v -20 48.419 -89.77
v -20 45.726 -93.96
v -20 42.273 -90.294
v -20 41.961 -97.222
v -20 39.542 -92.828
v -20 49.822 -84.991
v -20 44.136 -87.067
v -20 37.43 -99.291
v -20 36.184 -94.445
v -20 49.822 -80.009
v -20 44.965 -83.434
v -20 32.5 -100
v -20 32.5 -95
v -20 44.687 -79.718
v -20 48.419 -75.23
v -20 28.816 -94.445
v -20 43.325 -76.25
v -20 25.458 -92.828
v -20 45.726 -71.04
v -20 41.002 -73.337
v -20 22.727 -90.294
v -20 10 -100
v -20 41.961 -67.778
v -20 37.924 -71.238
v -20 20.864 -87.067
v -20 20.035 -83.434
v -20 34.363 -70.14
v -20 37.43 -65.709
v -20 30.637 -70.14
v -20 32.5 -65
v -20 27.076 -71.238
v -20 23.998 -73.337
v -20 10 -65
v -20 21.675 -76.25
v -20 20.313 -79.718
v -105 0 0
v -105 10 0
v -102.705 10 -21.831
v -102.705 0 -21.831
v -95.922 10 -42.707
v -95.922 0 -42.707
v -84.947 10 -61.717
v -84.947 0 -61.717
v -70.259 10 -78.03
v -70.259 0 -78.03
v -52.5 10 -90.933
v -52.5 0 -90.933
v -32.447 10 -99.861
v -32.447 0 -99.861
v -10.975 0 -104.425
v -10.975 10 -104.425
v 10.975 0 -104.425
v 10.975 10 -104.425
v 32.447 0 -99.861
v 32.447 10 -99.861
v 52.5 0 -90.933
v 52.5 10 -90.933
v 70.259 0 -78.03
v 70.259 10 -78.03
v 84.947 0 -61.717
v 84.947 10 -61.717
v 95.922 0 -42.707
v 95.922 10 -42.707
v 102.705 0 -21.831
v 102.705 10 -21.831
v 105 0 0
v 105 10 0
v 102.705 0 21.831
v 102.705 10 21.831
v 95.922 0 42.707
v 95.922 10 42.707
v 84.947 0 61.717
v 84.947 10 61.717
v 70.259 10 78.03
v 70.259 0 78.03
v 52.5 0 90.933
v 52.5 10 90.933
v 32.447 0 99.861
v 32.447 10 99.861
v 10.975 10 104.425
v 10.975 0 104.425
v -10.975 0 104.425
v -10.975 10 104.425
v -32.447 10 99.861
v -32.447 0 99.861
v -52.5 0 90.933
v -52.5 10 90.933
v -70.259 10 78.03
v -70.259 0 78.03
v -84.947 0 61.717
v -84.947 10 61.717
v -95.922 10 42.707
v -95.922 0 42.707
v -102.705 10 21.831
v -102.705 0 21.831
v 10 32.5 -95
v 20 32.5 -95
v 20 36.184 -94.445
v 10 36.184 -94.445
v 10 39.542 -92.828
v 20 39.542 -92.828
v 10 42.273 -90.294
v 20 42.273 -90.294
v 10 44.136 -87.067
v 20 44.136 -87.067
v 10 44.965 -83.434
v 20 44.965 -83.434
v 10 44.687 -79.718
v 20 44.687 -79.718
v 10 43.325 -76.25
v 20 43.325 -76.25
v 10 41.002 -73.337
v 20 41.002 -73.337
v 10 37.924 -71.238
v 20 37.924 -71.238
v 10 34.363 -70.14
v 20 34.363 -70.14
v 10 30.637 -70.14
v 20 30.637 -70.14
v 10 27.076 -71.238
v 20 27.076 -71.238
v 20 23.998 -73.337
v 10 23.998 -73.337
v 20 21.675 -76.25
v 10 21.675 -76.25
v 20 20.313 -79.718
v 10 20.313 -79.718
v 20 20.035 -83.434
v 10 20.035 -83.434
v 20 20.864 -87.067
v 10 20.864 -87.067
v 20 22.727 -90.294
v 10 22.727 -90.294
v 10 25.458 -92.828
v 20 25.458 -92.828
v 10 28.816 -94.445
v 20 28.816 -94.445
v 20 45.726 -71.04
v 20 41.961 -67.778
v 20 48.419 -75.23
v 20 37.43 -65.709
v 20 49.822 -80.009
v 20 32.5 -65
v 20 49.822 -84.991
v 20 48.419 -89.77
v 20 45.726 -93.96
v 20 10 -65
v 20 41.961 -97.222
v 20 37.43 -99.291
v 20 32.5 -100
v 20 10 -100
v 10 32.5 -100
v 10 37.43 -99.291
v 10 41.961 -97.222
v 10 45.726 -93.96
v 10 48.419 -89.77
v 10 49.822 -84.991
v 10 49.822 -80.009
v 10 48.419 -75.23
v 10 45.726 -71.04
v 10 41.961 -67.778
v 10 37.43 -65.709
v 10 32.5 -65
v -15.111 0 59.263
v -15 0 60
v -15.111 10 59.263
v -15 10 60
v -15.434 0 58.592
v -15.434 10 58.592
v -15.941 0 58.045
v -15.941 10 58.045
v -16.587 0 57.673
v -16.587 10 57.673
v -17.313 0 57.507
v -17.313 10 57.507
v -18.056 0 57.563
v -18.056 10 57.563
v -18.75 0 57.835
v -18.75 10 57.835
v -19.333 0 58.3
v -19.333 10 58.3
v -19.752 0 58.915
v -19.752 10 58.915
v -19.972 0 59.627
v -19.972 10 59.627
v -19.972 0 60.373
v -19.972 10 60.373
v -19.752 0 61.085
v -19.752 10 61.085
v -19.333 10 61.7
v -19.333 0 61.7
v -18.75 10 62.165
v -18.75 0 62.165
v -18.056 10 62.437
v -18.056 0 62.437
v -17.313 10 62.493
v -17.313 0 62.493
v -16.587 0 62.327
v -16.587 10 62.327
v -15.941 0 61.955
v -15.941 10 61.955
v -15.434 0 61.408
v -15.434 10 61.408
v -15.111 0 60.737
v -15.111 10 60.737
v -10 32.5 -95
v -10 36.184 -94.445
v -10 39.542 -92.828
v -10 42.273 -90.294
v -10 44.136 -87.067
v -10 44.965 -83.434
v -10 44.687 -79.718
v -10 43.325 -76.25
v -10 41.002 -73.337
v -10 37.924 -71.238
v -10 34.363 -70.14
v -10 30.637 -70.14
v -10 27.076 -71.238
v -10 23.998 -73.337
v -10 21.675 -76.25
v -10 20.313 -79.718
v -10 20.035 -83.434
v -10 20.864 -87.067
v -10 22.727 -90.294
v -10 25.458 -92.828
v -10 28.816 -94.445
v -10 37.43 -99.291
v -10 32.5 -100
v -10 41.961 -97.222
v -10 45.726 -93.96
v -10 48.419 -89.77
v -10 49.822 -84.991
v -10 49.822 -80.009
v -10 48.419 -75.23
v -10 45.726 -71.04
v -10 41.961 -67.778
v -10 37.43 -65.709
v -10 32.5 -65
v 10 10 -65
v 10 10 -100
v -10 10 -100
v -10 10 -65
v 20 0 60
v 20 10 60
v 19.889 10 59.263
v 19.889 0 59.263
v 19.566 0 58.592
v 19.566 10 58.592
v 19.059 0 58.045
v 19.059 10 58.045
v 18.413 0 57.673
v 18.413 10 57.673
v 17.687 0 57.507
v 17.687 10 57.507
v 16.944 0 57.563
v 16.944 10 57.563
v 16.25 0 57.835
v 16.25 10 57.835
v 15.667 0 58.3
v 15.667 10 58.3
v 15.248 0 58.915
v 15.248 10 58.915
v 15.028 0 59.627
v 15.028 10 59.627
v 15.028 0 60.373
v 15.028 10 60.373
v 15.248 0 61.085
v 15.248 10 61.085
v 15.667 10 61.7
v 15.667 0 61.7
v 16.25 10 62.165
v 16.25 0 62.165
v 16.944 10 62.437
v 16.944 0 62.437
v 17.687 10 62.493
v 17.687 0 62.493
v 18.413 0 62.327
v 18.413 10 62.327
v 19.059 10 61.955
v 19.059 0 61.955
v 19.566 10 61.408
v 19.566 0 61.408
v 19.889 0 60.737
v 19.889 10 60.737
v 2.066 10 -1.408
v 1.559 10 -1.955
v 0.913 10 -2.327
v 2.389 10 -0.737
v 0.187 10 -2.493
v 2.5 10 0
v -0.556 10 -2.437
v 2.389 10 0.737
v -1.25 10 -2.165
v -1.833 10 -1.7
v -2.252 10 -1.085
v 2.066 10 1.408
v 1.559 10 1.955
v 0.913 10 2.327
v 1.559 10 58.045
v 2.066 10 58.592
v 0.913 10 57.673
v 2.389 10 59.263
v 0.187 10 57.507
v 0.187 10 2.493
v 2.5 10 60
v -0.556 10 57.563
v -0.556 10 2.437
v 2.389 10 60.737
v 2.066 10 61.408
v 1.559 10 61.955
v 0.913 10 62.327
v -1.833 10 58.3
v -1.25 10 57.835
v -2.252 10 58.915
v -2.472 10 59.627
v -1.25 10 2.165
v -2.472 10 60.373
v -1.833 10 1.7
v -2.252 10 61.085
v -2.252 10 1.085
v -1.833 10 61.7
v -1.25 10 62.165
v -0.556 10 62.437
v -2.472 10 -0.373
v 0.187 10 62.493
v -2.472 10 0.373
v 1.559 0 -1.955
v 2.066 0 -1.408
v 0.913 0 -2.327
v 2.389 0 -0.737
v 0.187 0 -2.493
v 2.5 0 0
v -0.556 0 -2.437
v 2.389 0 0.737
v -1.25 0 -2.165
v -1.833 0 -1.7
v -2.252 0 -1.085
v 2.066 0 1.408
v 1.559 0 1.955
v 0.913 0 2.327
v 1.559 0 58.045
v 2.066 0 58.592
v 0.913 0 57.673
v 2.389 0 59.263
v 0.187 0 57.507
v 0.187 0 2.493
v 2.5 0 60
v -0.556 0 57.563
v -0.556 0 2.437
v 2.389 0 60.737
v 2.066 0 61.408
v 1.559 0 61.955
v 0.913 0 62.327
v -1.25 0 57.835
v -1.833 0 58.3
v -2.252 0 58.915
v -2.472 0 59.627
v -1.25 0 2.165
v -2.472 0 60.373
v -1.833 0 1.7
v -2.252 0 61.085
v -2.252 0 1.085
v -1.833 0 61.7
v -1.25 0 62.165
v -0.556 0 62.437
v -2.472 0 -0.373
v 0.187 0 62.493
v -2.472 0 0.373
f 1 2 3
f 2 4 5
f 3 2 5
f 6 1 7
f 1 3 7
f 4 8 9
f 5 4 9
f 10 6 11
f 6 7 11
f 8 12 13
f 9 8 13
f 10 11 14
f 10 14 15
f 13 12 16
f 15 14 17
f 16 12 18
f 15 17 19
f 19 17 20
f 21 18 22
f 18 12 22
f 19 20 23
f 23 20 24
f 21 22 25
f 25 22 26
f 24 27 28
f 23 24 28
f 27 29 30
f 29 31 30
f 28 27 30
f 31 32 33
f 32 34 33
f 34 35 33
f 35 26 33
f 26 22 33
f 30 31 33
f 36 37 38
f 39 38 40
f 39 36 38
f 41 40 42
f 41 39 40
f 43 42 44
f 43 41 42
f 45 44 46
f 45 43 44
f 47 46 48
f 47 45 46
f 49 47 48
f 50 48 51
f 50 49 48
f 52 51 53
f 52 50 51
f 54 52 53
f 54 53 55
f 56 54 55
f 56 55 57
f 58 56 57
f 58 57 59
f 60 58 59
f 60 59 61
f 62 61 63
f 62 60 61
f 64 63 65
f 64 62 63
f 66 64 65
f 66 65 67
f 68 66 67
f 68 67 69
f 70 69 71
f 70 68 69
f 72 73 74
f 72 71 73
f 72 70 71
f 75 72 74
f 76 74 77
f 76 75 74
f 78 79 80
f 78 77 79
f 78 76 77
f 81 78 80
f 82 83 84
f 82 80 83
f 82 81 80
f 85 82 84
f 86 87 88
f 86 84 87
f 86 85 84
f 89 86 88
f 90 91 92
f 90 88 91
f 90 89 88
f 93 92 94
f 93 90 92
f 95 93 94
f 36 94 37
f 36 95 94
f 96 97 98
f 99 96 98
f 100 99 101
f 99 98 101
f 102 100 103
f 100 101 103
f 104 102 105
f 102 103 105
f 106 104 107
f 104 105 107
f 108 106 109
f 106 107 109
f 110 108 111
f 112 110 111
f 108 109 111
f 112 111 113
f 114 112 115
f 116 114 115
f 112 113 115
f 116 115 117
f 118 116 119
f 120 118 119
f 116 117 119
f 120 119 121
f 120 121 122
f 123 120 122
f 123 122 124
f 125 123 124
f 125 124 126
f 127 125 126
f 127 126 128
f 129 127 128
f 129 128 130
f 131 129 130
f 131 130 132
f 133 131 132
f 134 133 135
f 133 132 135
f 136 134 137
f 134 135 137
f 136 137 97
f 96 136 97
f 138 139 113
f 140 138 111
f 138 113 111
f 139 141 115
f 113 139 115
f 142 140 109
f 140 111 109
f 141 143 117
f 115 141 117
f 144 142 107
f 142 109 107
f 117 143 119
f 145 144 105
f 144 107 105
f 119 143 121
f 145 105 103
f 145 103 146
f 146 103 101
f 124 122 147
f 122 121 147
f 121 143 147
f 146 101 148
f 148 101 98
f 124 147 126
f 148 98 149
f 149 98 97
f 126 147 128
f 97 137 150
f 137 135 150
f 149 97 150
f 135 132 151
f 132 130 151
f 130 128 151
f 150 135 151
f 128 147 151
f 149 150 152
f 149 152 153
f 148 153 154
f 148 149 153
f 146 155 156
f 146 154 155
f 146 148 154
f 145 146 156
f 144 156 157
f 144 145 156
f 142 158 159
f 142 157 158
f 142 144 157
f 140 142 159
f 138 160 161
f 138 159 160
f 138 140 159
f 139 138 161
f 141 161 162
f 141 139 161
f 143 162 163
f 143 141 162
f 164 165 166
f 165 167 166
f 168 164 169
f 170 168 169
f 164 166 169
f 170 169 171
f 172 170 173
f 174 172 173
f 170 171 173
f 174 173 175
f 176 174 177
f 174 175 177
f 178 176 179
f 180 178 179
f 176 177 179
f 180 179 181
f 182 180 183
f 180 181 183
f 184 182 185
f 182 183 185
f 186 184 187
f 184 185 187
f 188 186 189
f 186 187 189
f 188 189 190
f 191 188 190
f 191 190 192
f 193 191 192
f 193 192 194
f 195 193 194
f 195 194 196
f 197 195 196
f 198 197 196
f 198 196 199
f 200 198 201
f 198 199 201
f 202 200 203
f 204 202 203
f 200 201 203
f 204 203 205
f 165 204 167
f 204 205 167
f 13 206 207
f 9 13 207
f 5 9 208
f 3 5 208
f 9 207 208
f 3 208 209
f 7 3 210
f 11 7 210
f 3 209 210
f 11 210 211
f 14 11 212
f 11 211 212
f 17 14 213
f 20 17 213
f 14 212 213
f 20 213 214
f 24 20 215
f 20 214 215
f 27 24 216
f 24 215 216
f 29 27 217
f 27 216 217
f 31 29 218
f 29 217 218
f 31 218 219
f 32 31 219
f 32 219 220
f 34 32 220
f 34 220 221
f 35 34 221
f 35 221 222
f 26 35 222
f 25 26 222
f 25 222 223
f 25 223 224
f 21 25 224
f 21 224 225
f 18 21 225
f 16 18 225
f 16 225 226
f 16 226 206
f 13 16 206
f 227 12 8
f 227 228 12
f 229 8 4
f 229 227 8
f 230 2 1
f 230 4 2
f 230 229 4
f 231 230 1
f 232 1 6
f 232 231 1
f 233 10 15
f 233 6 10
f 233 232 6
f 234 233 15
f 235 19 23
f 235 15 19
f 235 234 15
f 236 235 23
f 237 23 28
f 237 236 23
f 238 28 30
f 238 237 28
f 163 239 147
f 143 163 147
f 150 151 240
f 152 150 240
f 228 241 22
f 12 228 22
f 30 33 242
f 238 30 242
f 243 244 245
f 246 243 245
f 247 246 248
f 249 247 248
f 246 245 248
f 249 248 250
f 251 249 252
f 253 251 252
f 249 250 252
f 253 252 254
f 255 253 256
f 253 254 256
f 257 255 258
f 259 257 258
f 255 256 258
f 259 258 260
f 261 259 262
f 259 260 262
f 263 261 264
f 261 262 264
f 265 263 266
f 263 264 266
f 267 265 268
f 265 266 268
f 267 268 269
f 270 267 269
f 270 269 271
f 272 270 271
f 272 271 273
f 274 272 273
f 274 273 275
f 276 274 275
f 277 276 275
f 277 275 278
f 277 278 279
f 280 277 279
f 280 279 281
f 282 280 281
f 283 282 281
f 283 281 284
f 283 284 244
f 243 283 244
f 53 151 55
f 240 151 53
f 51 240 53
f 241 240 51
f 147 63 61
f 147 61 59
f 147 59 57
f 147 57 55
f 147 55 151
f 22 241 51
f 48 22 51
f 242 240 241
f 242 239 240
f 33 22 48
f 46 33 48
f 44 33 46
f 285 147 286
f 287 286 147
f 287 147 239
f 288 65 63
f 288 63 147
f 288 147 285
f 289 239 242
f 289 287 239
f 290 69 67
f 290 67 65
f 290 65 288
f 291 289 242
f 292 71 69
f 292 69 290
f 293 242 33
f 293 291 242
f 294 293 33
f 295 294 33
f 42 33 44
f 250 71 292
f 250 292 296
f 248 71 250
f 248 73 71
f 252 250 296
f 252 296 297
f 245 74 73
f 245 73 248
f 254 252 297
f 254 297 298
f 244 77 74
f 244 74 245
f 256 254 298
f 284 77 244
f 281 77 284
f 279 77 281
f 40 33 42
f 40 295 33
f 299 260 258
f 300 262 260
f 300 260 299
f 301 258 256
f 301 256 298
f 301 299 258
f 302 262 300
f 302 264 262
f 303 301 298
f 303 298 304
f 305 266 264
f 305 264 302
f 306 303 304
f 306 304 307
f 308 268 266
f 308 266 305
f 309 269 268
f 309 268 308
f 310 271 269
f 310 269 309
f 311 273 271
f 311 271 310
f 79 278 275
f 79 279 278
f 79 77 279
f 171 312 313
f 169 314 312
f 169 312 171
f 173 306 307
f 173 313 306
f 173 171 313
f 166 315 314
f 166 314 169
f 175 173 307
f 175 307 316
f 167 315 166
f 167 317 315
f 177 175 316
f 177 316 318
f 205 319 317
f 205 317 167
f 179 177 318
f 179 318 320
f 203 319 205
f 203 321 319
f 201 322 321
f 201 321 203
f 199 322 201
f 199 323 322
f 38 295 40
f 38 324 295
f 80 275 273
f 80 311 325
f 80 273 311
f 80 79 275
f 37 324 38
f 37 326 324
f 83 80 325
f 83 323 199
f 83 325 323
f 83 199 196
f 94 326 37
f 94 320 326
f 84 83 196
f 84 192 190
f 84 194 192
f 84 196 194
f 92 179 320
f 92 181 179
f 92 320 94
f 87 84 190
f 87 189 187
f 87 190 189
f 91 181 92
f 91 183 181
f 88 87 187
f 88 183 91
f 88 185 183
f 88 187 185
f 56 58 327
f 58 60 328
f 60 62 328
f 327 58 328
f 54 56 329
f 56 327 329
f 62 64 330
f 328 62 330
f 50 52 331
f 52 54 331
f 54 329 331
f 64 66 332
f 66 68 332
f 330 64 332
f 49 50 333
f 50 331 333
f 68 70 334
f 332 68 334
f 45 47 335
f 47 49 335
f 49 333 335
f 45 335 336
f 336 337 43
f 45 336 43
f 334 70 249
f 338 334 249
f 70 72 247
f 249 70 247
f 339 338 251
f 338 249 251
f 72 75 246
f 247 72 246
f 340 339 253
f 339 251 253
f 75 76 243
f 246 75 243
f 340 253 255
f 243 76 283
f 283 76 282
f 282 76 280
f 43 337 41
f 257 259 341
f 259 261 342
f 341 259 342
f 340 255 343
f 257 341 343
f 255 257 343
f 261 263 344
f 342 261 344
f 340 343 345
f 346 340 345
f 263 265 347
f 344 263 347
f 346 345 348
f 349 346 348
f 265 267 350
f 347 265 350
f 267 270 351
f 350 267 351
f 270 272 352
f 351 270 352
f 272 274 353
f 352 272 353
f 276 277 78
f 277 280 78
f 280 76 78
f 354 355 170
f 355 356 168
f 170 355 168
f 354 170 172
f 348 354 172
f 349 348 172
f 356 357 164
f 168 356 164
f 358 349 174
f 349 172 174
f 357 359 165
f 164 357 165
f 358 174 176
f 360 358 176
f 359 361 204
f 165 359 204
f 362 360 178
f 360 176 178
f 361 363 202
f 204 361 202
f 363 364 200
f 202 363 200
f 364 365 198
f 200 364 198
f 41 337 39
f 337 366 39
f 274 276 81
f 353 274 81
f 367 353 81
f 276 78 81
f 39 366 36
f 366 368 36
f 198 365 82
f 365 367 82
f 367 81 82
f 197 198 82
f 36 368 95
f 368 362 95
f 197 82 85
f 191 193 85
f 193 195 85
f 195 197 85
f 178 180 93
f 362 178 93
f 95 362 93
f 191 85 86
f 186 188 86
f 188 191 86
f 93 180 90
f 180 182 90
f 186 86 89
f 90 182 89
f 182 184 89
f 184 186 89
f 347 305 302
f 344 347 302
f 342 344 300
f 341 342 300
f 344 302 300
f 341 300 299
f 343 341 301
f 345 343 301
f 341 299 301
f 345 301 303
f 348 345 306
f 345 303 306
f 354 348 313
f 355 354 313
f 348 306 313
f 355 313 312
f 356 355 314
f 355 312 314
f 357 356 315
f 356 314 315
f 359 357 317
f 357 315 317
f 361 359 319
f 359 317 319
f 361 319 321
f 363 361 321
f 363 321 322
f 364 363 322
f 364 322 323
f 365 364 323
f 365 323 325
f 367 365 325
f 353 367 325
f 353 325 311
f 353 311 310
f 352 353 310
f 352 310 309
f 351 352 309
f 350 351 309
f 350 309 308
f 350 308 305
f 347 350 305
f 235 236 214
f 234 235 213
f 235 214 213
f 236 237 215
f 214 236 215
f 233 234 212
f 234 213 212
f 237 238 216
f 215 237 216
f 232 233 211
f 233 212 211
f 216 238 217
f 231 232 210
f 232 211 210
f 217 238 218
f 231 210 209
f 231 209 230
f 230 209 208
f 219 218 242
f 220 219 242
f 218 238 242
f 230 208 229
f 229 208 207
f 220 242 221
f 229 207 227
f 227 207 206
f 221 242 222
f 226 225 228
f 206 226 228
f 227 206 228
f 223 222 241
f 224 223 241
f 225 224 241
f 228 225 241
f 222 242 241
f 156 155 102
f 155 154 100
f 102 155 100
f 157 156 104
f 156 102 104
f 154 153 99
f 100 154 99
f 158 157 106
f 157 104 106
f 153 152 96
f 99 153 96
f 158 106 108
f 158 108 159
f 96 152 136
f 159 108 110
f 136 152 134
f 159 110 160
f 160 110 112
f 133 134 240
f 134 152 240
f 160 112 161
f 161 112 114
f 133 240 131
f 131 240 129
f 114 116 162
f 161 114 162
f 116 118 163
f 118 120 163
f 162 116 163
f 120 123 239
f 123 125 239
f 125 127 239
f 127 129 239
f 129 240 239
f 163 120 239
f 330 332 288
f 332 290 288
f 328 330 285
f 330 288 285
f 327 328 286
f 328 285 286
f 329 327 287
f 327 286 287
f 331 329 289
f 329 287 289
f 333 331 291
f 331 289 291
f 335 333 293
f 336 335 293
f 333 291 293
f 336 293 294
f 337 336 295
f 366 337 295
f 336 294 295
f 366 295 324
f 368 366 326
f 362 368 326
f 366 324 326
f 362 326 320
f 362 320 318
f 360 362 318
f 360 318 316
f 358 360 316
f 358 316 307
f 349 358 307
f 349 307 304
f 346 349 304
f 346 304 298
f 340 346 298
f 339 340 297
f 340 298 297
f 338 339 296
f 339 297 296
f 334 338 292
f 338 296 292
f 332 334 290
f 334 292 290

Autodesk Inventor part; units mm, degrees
ref_plane "YZ Plane" through (0, 0, 0) normal (1, 0, 0) x (0, 1, 0)
ref_plane "XZ Plane" through (0, 0, 0) normal (0, 1, 0) x (-1, 0, 0)
ref_plane "XY Plane" through (0, 0, 0) normal (0, 0, 1) x (1, 0, 0)
sketch "Sketch1" plane through (0, 0, 0) normal (0, 1, 0) x (-1, 0, 0)
  circle A0 centre (0, 0) radius 105
  dimension "d0" = 210
extrude "Extrusion1" add sketch "Sketch1" along normal blind 10
sketch "Sketch2" plane through (0, 10, 0) normal (0, 1, 0) x (1, 0, 0)
  line L0 (-79.8594, -68.6516) -> (79.5179, -68.6516)
  line L1 (0, 0) -> (0, -80)
  line L2 (0, -80) -> (0, -60)
  line L3 (0, -60) -> (17.5, -60)
  line L4 (0, -60) -> (-17.5, -60)
  circle A0 centre (-17.5, -60) radius 2.5
  circle A1 centre (0, -60) radius 2.5
  circle A2 centre (17.5, -60) radius 2.5
  dimension "d4" = 80
  dimension "d5" = 20
  dimension "d6" = 17.5
  dimension "d7" = 17.5
  dimension "d8" = 5
  dimension "d9" = 5
  dimension "d10" = 5
extrude "Extrusion2" cut sketch "Sketch2" against normal blind 10
sketch "Sketch3" plane through (0, 10, 0) normal (0, 1, 0) x (1, 0, 0)
  circle A0 centre (0, 0) radius 2.5
  dimension "d13" = 5
extrude "Extrusion3" cut sketch "Sketch3" against normal blind 10
sketch "Sketch4" plane through (0, 10, 0) normal (0, 1, 0) x (1, 0, 0)
  circle A0 centre (0, 0) radius 2.5 projected
  line L0 (0, 0) -> (0, 80)
  line L1 (-15, 80) -> (-15, 65)
  line L2 (-15, 65) -> (15, 65)
  line L3 (15, 65) -> (15, 95)
  line L4 (15, 95) -> (-15, 95)
  line L5 (-15, 95) -> (-15, 80)
  line L6 (0, 80) -> (-7.5, 80)
  line L7 (-7.5, 80) -> (7.5, 80)
  line L8 (7.5, 80) -> (7.5, 95)
  line L9 (7.5, 80) -> (7.5, 65)
  line L10 (-7.5, 80) -> (-7.5, 95)
  line L11 (-7.5, 80) -> (-7.5, 65)
  dimension "d20" = 15
  dimension "d21" = 15
  dimension "d22" = 30
  dimension "d23" = 30
  dimension "d24" = 7.5
  dimension "d25" = 15
extrude "Extrusion4" add sketch "Sketch4" along normal blind 30 contours L2 L11 L6 L0 | L0 L7 L9 L2 | L6 L10 L4 L8 L7
sketch "Sketch5" plane through (7.5, 10, -65) normal (1, 0, 0) x (0, 0, -1)
  line L0 (40, 0) -> (-170, 0) projected
  line L1 (40, 0) -> (15, 0)
  line L2 (15, 0) -> (15, 15)
  circle A0 centre (15, 15) radius 7.5
  line L3 (30, 0) -> (30, 30) projected
  arc A1 (30, 15) -> (0, 15) centre (15, 15) ccw
  line L4 (15, 15) -> (0, 15) construction
  line L5 (15, 15) -> (30, 15) construction
  line L6 (0, 0) -> (0, 30) projected
  line L7 (0, 15) -> (0, 30)
  line L8 (0, 30) -> (30, 30) projected
  line L9 (0, 30) -> (30, 30)
  line L10 (30, 30) -> (30, 15)
  point P0 (-65, -10)
  point P1 (15, 30)
  dimension "d28" = 25
  dimension "d29" = 15
  dimension "d30" = 15
  dimension "d31" = 180
extrude "Extrusion5" cut sketch "Sketch5" against normal blind 30 contours A1 L8 L3 | A1 L6 L8 | A0
sketch "Sketch6" plane through (7.5, 10, -65) normal (1, 0, 0) x (0, 0, -1)
  circle A0 centre (15, 15) radius 7.5 projected
  circle A1 centre (15, 15) radius 5
  circle A2 centre (15, 15) radius 7.5
  point P0 (-65, -10)
  dimension "d34" = 10
extrude "Extrusion6" add sketch "Sketch6" against normal blind 15
sketch "Sketch7" plane through (7.5, 10, -65) normal (1, 0, 0) x (0, 0, -1)
  line L0 (0, 0) -> (30, 0) projected
  line L1 (0, 0) -> (30, 0)
  line L2 (30, 0) -> (30, 34.6991)
  line L3 (30, 34.6991) -> (0, 34.6991)
  line L4 (0, 34.6991) -> (0, 0)
  point P0 (-65, -10)
extrude "Extrusion7" cut sketch "Sketch7" against normal blind 15
sketch "Sketch8" plane through (0, 10, 0) normal (0, 1, 0) x (1, 0, 0)
  circle A0 centre (0, 0) radius 2.5 projected
  line L0 (0, 0) -> (0, 100)
  line L1 (0, 100) -> (-10, 100)
  line L2 (-10, 100) -> (-20, 100)
  line L3 (-20, 100) -> (-20, 65)
  line L4 (-20, 65) -> (-10, 65)
  line L5 (-10, 65) -> (-10, 100)
  line L6 (0, 100) -> (10, 100)
  line L7 (10, 100) -> (20, 100)
  line L8 (20, 100) -> (20, 65)
  line L9 (20, 65) -> (10, 65)
  line L10 (10, 65) -> (10, 100)
  dimension "d42" = 100
  dimension "d43" = 10
  dimension "d44" = 10
  dimension "d45" = 35
  dimension "d46" = 10
  dimension "d47" = 10
  dimension "d48" = 35
extrude "Extrusion8" add sketch "Sketch8" along normal blind 35 contours L5 L4 L3 L2 | L7 L8 L9 L10
thicken "Thicken1" operation add thickness 5 both sides no extend neighbours yes toward (0, 1, 0) faces at (13.3333, 45, -88.3333)
thicken "Thicken2" operation add thickness 5 both sides no extend neighbours yes toward (0, 1, 0) faces at (-16.6667, 45, -88.3333)
sketch "Sketch10" plane through (20, 10, -65) normal (1, 0, 0) x (0, 0, -1)
  line L0 (0, 0) -> (35, 0) projected
  line L1 (0, 0) -> (17.5, 0)
  line L2 (17.5, 0) -> (17.5, 22.5)
  circle A0 centre (17.5, 22.5) radius 12.5
  circle A1 centre (17.5, 22.5) radius 17.5
  line L3 (35, 0) -> (35, 40) projected
  line L4 (0, 0) -> (0, 40) projected
  line L5 (0, 22.5) -> (0, 40)
  line L6 (35, 40) -> (0, 40) projected
  line L7 (0, 40) -> (35, 40)
  line L8 (35, 40) -> (35, 22.5)
  point P0 (-65, -10)
  point P1 (17.5, 40)
  dimension "d60" = 22.5
  dimension "d61" = 25
extrude "Extrusion9" cut sketch "Sketch10" against normal blind 40 contours L4 L6 A1 | L6 L3 A1 | A0
sketch "Sketch11" plane through (20, 10, -65) normal (1, 0, 0) x (0, 0, -1)
  line L0 (40, 0) -> (-170, 0) projected
  line L1 (35.2175, 0) -> (0.2175, 0)
  line L2 (0.2175, 0) -> (-34.7825, 0)
  line L3 (0.2175, 0) -> (40.2175, 0)
  circle A0 centre (40.2175, 17.5) radius 12.5
  circle A1 centre (40.2175, 17.5) radius 17.5
  line L4 (-34.7825, 0) -> (32.4725, 33.1928)
  point P0 (-65, -10)
  dimension "d73" = 35
  dimension "d74" = 35
  dimension "d75" = 40
  dimension "d78" = 35
sketch "Sketch12" plane through (-20, 10, -100) normal (-1, 0, 0) x (0, 0, 1)
  line L0 (205, 0) -> (-5, 0) projected
  line L1 (37.401, 0) -> (37.401, 45.2729)
  line L2 (37.401, 45.2729) -> (-3.1543, 48.8051)
  line L3 (-3.1543, 48.8051) -> (-3.1543, 0)
  line L4 (37.401, 0) -> (-3.1543, 0)
  point P0 (100, -10)
extrude "Extrusion10" cut sketch "Sketch12" against normal blind 40
extrude "Extrusion11" add sketch "Sketch11" against normal blind 40
sketch "Sketch13" plane through (0, 0, 0) normal (0, 0, 1) x (1, 0, 0)
  line L0 (105, 10) -> (-105, 10) projected
  line L1 (0, 10) -> (10, 10)
  line L2 (10, 10) -> (10, 48.8421)
  line L3 (20, 43.1928) -> (-20, 43.1928) projected
  line L4 (10, 48.8421) -> (-10, 48.8421)
  line L5 (-10, 48.8421) -> (-10, 10)
  line L6 (-10, 10) -> (10, 10)
  point P0 (0, 0)
  point P1 (-20, 10)
  point P2 (20, 10)
  dimension "d83" = 10
  dimension "d84" = 20
extrude "Extrusion12" cut sketch "Sketch13" against normal blind 150
sketch "Sketch14" plane through (20, 10, -65) normal (1, 0, 0) x (0, 0, -1)
  line L0 (38.0776, 0) -> (-34.7825, 0) projected
  line L1 (-34.7825, 0) -> (42.8397, 49.7383)
  line L2 (42.8397, 49.7383) -> (77.8644, 0)
  line L3 (77.8644, 0) -> (-34.7825, 0)
  point P0 (-65, -10)
extrude "Extrusion13" cut sketch "Sketch14" against normal blind 150
sketch "Sketch15" plane through (0, 10, 0) normal (0, 1, 0) x (1, 0, 0)
  circle A0 centre (0, 0) radius 2.5 projected
  line L0 (0, 0) -> (0, 100)
  line L1 (0, 100) -> (-20, 100)
  line L2 (-20, 100) -> (-20, 65)
  line L3 (-20, 65) -> (-10, 65)
  line L4 (-10, 65) -> (-10, 100)
  line L5 (-10, 65) -> (10, 65)
  line L6 (10, 65) -> (20, 65)
  line L7 (20, 65) -> (20, 100)
  line L8 (20, 100) -> (10, 100)
  line L9 (10, 100) -> (10, 65)
  dimension "d89" = 100
  dimension "d90" = 20
  dimension "d91" = 35
  dimension "d92" = 10
  dimension "d93" = 20
  dimension "d94" = 10
  dimension "d95" = 35
  dimension "d96" = 10
extrude "Extrusion14" add sketch "Sketch15" along normal blind 40 contours L3 L2 L1 L4 | L9 L8 L7 L6
sketch "Sketch16" plane through (20, 10, -65) normal (1, 0, 0) x (0, 0, -1)
  line L0 (0, 40) -> (35, 40) projected
  line L1 (17.5, 40) -> (17.5, 22.5)
  circle A0 centre (17.5, 22.5) radius 12.5
  circle A1 centre (17.5, 22.5) radius 17.5
  line L2 (35, 0) -> (35, 40) projected
  line L3 (0, 0) -> (0, 40) projected
  line L4 (0, 22.5) -> (0, 40)
  line L5 (0, 40) -> (35, 40)
  line L6 (35, 40) -> (35, 22.5)
  point P0 (-65, -10)
  dimension "d99" = 17.5
  dimension "d100" = 25
extrude "Extrusion15" cut sketch "Sketch16" against normal blind 40 contours L0 A1 L3 | L0 L2 A1 | A0
properties part number "Base do telescópio"
